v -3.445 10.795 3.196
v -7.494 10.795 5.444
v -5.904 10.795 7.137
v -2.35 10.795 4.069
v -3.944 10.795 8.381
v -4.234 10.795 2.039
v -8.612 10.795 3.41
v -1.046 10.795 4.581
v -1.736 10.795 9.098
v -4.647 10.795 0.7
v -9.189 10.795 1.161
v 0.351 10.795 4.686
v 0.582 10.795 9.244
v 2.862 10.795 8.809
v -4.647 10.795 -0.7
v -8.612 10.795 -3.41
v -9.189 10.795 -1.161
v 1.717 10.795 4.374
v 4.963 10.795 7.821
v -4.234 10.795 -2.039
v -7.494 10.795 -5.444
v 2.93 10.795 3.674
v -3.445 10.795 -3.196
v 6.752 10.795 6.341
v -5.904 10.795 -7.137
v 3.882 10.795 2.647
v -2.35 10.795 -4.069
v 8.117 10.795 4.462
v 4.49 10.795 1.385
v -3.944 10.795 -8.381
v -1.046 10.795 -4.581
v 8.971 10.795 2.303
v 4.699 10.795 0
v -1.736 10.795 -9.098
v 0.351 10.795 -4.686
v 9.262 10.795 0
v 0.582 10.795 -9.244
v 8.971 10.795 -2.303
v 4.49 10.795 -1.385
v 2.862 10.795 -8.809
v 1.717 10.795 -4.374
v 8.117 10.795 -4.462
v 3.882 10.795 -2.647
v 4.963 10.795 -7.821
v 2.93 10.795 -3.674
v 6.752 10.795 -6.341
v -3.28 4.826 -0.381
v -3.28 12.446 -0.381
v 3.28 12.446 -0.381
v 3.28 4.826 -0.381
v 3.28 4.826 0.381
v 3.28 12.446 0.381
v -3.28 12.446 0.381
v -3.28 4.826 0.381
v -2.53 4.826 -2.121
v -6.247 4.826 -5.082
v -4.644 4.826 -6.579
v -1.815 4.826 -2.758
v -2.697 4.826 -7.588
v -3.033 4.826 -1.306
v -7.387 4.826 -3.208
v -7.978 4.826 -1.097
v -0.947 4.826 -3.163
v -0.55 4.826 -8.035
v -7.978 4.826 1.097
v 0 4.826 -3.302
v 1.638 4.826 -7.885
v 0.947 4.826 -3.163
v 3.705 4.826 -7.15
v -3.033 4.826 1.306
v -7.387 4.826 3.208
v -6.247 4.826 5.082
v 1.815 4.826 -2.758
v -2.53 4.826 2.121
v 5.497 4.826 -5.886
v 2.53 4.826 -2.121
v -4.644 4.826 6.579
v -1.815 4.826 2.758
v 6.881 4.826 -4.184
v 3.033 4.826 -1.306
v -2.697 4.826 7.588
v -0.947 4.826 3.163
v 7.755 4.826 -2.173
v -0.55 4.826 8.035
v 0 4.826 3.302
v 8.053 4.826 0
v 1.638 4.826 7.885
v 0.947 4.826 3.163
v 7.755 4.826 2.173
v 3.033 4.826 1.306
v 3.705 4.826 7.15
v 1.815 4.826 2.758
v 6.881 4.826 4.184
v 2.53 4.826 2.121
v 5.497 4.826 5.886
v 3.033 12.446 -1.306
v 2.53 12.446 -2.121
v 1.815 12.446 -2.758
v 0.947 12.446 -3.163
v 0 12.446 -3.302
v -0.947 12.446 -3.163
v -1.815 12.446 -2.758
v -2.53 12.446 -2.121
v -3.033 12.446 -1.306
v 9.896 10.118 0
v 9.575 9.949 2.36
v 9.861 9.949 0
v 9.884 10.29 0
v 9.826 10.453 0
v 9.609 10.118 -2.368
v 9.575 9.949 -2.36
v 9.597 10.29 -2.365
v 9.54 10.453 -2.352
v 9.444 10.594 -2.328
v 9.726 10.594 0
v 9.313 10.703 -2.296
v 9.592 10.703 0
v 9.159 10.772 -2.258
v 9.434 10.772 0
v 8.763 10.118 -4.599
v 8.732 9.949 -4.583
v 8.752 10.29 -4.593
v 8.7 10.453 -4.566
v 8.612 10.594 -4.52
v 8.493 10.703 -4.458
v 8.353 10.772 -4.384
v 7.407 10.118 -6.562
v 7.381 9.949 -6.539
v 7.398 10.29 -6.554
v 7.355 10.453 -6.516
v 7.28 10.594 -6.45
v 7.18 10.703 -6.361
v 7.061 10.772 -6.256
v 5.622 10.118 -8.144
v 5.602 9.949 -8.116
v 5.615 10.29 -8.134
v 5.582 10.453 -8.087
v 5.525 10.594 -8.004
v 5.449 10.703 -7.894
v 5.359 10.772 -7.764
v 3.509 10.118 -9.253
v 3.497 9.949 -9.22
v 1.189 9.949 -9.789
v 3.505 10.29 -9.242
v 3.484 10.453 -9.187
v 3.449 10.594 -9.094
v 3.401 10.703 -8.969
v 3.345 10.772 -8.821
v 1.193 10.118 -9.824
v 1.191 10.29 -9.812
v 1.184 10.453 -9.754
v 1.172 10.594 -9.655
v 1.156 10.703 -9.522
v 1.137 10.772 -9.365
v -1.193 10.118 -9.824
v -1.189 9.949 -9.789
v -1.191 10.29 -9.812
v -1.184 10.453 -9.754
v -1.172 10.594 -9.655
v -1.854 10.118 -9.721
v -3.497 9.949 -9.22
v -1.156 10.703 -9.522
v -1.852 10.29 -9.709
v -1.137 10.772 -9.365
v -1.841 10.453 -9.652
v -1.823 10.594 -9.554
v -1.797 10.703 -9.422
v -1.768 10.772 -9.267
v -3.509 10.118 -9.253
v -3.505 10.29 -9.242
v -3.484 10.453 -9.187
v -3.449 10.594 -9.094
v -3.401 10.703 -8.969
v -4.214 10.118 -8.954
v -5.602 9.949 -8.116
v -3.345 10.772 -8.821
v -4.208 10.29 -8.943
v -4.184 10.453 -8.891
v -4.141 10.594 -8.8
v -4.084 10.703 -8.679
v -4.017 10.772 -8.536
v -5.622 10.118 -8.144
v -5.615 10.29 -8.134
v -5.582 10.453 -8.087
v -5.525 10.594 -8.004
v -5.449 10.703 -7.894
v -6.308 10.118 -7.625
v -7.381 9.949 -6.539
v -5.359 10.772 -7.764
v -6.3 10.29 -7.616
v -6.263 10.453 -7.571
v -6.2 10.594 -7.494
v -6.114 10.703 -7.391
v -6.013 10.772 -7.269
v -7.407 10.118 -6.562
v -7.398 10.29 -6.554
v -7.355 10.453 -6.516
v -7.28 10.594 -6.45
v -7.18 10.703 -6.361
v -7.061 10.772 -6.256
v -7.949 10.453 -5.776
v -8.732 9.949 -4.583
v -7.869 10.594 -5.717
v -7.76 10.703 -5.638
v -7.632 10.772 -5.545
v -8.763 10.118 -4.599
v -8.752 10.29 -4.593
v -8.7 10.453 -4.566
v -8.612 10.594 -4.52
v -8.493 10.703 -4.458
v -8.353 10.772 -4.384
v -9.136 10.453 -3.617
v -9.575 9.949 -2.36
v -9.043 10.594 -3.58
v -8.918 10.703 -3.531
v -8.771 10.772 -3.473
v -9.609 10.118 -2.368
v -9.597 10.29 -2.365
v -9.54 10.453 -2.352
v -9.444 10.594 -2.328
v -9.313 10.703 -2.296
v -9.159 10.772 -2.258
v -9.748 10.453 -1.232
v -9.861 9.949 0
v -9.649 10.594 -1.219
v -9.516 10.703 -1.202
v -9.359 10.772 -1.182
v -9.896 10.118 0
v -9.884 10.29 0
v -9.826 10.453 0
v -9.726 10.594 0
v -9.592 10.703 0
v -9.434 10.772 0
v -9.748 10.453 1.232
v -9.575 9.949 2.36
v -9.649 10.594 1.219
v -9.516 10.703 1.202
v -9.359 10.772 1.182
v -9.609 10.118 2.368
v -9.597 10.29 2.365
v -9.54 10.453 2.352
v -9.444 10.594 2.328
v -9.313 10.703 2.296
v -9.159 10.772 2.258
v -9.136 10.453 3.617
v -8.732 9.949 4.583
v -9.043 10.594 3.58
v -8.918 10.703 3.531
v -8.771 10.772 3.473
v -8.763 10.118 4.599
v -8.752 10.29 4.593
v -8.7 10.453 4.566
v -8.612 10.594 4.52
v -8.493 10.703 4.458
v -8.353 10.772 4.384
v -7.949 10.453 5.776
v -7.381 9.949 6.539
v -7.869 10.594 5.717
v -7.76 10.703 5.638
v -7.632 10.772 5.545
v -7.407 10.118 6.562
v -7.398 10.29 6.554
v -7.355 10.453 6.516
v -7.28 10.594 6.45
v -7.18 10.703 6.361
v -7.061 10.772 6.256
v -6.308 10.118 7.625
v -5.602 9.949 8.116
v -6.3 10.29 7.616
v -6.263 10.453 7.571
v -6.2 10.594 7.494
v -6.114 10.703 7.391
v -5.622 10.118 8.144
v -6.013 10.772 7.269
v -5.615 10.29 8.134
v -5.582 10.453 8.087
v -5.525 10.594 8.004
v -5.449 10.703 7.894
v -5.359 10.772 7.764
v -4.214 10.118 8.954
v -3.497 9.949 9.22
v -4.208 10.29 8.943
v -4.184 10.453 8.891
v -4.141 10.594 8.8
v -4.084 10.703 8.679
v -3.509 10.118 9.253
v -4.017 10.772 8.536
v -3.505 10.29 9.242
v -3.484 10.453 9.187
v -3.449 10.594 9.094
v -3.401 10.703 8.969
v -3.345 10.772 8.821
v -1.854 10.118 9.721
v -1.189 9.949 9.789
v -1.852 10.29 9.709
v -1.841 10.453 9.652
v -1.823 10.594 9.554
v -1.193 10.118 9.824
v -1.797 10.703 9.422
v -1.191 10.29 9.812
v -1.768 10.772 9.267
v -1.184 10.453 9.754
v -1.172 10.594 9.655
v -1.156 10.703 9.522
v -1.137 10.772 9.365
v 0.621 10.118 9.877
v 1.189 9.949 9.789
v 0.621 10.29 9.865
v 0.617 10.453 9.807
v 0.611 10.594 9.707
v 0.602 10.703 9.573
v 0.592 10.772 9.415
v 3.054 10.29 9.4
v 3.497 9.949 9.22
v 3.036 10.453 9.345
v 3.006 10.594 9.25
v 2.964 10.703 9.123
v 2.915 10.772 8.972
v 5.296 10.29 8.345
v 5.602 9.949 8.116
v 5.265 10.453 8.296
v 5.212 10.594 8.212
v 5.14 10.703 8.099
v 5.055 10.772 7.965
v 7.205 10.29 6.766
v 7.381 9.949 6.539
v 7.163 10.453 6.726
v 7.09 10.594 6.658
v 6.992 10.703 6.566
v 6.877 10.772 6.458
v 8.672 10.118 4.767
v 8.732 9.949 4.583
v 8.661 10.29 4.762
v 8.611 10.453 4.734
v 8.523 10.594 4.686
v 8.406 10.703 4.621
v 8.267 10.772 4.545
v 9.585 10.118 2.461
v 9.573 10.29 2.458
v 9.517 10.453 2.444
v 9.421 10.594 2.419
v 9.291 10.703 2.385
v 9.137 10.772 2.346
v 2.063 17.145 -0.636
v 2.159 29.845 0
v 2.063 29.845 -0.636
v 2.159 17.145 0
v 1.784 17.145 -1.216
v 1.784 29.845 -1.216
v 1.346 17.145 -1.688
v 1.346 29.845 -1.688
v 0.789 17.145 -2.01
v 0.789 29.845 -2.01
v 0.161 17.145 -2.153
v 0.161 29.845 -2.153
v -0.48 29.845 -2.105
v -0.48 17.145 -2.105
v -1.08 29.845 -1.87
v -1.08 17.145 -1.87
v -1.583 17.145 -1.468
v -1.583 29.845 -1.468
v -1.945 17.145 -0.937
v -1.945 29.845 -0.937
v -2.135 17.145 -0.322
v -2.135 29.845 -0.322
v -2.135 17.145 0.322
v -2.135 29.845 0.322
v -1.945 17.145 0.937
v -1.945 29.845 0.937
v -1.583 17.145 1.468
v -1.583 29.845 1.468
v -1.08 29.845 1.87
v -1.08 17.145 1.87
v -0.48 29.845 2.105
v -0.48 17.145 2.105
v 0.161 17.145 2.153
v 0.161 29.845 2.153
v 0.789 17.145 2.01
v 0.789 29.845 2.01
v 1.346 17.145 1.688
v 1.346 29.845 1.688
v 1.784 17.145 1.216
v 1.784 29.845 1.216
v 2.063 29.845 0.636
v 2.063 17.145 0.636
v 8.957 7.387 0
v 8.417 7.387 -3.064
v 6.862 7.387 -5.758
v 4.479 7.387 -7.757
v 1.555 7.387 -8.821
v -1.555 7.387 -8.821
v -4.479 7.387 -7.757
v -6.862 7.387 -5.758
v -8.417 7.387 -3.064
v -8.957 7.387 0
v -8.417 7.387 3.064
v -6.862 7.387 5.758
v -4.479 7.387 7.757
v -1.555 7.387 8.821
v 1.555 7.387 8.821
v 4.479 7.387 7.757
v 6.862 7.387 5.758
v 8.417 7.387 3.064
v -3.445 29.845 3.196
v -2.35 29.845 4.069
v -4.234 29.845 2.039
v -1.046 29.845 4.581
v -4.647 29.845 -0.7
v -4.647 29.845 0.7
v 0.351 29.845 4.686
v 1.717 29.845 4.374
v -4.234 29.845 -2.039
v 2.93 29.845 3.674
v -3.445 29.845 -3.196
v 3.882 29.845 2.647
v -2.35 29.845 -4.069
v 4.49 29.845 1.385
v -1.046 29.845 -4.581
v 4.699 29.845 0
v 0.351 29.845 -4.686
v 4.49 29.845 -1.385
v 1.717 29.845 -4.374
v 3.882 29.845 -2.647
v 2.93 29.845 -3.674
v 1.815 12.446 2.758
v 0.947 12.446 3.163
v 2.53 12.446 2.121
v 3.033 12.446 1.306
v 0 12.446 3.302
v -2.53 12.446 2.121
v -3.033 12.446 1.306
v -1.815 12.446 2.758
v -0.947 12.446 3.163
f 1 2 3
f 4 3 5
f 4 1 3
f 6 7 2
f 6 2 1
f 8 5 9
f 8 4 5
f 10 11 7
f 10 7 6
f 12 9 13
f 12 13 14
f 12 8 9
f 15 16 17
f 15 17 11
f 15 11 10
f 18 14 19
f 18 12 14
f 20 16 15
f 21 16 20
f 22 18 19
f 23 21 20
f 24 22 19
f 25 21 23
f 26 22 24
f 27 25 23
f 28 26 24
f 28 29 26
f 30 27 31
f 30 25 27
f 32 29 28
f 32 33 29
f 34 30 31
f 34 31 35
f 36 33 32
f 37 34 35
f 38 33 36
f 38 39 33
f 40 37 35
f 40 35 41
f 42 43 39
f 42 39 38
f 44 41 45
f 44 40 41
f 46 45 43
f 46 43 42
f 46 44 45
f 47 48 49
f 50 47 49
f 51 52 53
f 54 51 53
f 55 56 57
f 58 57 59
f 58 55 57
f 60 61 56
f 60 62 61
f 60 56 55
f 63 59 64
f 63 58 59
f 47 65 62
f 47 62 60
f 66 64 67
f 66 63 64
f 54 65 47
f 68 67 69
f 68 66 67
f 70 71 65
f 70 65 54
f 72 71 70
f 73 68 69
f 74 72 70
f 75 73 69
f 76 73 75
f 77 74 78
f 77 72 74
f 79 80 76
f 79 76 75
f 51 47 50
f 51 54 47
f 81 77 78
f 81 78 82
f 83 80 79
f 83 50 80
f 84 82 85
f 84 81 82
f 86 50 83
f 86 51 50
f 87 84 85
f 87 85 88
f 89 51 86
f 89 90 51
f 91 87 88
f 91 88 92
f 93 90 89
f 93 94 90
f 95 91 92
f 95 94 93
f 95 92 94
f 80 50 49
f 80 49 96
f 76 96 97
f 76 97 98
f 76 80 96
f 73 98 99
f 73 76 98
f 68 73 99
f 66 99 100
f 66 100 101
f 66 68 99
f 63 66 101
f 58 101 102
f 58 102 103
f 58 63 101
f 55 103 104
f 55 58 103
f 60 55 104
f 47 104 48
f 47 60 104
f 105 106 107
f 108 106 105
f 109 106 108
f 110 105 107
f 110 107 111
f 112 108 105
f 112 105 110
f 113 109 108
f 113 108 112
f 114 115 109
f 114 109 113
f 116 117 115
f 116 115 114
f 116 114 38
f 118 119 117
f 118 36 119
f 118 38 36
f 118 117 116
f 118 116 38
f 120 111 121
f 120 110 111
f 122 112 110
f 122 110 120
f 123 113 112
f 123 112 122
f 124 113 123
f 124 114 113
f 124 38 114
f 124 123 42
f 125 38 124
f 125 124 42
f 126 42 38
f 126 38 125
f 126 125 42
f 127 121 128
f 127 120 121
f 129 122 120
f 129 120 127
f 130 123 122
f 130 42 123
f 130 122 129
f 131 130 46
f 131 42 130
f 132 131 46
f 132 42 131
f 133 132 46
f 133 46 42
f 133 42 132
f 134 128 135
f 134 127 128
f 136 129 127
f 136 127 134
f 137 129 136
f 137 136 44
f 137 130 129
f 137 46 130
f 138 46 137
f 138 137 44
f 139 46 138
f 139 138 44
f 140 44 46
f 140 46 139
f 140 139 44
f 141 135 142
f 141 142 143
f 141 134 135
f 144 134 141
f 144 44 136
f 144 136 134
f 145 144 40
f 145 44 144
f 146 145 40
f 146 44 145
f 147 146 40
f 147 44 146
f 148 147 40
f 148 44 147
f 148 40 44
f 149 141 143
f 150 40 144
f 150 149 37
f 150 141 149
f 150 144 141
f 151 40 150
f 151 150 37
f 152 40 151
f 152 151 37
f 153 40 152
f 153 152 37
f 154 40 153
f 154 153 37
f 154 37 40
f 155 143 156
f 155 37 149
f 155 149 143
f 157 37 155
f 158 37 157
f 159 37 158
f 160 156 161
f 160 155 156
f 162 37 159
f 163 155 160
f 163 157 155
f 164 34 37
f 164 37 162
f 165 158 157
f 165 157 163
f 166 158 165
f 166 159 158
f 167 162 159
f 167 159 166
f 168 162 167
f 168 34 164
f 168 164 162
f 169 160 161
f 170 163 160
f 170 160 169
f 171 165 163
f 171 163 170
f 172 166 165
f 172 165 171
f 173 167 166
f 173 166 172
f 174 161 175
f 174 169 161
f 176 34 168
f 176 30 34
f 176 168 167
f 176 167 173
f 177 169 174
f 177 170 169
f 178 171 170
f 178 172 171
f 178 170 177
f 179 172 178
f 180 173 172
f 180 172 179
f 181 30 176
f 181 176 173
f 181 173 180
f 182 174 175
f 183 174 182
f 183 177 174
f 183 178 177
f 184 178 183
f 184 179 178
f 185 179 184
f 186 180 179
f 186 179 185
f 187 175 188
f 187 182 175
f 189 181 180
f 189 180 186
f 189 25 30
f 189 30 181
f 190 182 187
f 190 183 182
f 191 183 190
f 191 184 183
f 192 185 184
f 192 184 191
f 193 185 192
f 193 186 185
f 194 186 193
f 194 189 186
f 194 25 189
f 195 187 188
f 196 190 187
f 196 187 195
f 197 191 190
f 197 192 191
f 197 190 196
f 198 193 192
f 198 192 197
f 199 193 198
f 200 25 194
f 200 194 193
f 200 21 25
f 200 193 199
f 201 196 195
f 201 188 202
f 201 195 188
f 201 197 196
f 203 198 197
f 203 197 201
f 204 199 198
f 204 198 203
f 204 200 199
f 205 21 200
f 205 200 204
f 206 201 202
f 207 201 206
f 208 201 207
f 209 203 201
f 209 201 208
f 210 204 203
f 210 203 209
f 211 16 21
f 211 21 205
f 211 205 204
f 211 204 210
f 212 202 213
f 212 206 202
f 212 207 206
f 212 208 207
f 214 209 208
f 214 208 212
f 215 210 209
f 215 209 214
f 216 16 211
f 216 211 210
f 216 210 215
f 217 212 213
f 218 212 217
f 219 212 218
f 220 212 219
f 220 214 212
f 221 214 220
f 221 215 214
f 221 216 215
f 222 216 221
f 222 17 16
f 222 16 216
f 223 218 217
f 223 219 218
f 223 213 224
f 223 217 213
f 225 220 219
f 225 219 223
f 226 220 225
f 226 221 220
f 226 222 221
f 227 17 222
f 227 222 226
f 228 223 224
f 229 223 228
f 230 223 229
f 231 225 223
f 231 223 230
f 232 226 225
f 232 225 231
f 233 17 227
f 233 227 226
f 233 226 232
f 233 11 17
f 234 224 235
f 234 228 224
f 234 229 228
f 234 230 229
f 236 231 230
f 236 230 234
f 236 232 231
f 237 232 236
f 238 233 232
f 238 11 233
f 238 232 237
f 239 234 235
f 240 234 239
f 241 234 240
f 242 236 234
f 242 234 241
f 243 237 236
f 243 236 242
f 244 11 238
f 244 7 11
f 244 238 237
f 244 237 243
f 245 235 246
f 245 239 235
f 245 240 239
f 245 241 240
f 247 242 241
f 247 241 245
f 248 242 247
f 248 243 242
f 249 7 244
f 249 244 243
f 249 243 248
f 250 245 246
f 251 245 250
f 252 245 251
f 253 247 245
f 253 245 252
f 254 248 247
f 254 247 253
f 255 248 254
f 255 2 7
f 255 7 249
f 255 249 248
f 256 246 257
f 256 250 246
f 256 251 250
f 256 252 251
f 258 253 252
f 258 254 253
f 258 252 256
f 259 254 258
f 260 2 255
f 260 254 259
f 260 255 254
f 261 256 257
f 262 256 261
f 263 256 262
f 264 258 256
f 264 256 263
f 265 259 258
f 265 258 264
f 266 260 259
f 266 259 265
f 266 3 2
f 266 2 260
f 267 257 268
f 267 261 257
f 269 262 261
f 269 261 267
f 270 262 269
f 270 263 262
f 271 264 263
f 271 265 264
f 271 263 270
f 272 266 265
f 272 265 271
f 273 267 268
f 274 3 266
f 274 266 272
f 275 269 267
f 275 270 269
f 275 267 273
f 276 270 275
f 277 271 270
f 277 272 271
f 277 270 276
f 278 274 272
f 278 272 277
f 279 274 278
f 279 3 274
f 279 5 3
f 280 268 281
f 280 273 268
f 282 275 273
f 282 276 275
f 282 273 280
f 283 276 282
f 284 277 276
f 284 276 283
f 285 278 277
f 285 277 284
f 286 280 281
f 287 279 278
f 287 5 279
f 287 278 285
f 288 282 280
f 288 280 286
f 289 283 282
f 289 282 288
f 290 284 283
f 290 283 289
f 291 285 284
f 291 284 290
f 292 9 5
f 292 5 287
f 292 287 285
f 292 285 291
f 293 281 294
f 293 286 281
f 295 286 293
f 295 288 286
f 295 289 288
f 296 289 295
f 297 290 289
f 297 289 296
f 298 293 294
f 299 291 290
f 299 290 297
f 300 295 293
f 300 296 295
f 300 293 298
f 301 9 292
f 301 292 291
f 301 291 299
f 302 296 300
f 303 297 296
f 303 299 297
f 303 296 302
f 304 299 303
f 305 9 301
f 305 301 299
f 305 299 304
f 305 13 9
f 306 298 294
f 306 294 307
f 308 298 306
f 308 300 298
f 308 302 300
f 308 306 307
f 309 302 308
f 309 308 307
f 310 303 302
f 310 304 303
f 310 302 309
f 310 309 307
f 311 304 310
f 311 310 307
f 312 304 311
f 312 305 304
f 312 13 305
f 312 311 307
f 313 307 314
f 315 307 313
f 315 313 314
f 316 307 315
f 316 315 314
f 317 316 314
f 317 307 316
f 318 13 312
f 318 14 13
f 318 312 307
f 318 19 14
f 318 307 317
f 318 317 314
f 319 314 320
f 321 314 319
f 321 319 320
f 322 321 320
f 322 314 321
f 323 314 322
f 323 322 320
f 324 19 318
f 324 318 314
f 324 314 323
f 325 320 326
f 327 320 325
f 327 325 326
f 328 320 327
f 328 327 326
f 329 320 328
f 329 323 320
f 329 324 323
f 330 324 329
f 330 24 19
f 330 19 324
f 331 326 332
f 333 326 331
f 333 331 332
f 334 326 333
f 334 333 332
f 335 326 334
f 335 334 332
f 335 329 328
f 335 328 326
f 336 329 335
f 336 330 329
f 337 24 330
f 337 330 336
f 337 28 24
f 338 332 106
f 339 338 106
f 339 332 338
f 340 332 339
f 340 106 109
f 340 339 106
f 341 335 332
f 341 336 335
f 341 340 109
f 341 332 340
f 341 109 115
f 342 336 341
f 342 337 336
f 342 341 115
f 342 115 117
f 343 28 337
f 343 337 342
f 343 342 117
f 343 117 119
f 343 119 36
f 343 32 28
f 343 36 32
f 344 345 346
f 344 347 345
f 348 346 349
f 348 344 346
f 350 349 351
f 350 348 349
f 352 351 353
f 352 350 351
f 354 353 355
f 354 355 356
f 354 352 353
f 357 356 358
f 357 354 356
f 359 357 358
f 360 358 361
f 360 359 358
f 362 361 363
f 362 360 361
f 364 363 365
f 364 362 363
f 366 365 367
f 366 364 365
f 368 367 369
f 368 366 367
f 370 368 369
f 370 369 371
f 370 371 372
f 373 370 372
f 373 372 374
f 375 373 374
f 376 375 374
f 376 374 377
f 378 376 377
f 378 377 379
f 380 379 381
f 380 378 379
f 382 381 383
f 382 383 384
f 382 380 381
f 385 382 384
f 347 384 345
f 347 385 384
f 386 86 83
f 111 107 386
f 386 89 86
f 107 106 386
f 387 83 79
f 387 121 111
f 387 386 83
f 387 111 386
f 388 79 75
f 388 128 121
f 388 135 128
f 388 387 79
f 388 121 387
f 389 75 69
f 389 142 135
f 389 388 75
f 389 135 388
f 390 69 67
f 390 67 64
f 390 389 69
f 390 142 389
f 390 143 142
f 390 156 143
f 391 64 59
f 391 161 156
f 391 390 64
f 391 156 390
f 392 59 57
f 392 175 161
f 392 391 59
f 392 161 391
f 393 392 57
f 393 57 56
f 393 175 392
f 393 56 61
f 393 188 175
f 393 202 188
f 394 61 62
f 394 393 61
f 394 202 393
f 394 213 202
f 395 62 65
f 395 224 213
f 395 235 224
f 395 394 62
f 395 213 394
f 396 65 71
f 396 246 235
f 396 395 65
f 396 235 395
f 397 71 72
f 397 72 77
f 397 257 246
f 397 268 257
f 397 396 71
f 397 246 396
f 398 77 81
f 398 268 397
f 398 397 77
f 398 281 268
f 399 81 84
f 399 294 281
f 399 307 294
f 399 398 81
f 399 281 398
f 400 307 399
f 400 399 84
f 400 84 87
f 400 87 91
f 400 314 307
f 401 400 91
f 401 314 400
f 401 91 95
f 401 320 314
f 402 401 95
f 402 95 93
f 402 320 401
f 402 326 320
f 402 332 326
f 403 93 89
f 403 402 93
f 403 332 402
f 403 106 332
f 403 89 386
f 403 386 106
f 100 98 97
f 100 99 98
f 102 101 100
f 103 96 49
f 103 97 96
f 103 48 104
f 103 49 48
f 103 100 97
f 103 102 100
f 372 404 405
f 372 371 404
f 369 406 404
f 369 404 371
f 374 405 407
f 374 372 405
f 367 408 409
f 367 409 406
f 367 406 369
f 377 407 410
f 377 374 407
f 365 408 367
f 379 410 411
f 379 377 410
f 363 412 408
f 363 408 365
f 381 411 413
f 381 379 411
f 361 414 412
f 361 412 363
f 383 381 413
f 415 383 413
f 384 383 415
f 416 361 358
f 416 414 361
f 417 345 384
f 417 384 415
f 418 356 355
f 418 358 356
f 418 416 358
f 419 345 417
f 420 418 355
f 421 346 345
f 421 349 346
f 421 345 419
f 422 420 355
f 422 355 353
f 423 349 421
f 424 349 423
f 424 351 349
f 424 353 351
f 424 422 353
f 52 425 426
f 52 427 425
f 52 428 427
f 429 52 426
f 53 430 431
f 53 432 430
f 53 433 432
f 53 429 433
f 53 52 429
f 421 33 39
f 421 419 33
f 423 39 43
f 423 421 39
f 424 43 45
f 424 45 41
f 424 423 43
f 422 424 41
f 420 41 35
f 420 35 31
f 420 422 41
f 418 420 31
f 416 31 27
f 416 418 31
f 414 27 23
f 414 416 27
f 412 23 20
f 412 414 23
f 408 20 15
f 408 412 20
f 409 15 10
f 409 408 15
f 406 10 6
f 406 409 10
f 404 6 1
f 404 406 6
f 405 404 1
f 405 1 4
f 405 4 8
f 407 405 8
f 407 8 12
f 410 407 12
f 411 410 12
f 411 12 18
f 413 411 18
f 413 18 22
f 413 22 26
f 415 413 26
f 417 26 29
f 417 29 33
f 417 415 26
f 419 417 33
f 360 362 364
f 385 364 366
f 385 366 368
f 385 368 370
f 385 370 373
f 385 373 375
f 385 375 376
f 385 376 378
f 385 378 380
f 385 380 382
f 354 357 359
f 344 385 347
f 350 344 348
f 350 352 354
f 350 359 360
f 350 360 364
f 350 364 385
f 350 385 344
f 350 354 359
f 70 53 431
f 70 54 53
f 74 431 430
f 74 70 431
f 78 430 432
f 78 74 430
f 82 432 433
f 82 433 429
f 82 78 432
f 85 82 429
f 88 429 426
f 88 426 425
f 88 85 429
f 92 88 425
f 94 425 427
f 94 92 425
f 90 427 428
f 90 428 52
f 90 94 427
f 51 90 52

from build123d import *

# Parameters (mm, degrees)
F3_DEPTH = 7.62
F4_R     = 0.635


with BuildPart() as f1:
    # F0 (on Top) → F1 (revolve)
    with BuildSketch(Plane.XY):
        Polygon((3.302, 7.62), (3.302, 4.826), (8.0532941176, 4.826), (10.16, 10.795), (4.699, 10.795), (3.302, 10.795), align=None)
        Polygon((0, 17.145), (0, 12.446), (3.302, 12.446), (3.302, 10.795), (4.699, 10.795), (4.699, 29.845), (2.159, 29.845), (2.159, 17.145), align=None)
    revolve(axis=Axis((0, 23.495, 0), (0, 1, 0)))

    # F2 (on face) → F3 (join)
    with BuildSketch(Plane.XZ.offset(-12.446)):
        with BuildLine():
            ThreePointArc((-3.2799455788, 0.381), (-3.302, 0), (-3.2799455788, -0.381))
            Line((-3.2799455788, -0.381), (3.2799455788, -0.381))
            ThreePointArc((3.2799455788, -0.381), (3.2964817838, -0.1908188916), (3.302, 0))
            ThreePointArc((3.302, 0), (3.2964817838, 0.1908188916), (3.2799455788, 0.381))
            Line((3.2799455788, 0.381), (-3.2799455788, 0.381))
        make_face()
    extrude(amount=F3_DEPTH)

    # F4
    f4_edges = [f1.edges().sort_by_distance(p)[0] for p in [
        (-10.16, 10.795, 0),
    ]]
    fillet(f4_edges, radius=F4_R)


solid = f1.part
